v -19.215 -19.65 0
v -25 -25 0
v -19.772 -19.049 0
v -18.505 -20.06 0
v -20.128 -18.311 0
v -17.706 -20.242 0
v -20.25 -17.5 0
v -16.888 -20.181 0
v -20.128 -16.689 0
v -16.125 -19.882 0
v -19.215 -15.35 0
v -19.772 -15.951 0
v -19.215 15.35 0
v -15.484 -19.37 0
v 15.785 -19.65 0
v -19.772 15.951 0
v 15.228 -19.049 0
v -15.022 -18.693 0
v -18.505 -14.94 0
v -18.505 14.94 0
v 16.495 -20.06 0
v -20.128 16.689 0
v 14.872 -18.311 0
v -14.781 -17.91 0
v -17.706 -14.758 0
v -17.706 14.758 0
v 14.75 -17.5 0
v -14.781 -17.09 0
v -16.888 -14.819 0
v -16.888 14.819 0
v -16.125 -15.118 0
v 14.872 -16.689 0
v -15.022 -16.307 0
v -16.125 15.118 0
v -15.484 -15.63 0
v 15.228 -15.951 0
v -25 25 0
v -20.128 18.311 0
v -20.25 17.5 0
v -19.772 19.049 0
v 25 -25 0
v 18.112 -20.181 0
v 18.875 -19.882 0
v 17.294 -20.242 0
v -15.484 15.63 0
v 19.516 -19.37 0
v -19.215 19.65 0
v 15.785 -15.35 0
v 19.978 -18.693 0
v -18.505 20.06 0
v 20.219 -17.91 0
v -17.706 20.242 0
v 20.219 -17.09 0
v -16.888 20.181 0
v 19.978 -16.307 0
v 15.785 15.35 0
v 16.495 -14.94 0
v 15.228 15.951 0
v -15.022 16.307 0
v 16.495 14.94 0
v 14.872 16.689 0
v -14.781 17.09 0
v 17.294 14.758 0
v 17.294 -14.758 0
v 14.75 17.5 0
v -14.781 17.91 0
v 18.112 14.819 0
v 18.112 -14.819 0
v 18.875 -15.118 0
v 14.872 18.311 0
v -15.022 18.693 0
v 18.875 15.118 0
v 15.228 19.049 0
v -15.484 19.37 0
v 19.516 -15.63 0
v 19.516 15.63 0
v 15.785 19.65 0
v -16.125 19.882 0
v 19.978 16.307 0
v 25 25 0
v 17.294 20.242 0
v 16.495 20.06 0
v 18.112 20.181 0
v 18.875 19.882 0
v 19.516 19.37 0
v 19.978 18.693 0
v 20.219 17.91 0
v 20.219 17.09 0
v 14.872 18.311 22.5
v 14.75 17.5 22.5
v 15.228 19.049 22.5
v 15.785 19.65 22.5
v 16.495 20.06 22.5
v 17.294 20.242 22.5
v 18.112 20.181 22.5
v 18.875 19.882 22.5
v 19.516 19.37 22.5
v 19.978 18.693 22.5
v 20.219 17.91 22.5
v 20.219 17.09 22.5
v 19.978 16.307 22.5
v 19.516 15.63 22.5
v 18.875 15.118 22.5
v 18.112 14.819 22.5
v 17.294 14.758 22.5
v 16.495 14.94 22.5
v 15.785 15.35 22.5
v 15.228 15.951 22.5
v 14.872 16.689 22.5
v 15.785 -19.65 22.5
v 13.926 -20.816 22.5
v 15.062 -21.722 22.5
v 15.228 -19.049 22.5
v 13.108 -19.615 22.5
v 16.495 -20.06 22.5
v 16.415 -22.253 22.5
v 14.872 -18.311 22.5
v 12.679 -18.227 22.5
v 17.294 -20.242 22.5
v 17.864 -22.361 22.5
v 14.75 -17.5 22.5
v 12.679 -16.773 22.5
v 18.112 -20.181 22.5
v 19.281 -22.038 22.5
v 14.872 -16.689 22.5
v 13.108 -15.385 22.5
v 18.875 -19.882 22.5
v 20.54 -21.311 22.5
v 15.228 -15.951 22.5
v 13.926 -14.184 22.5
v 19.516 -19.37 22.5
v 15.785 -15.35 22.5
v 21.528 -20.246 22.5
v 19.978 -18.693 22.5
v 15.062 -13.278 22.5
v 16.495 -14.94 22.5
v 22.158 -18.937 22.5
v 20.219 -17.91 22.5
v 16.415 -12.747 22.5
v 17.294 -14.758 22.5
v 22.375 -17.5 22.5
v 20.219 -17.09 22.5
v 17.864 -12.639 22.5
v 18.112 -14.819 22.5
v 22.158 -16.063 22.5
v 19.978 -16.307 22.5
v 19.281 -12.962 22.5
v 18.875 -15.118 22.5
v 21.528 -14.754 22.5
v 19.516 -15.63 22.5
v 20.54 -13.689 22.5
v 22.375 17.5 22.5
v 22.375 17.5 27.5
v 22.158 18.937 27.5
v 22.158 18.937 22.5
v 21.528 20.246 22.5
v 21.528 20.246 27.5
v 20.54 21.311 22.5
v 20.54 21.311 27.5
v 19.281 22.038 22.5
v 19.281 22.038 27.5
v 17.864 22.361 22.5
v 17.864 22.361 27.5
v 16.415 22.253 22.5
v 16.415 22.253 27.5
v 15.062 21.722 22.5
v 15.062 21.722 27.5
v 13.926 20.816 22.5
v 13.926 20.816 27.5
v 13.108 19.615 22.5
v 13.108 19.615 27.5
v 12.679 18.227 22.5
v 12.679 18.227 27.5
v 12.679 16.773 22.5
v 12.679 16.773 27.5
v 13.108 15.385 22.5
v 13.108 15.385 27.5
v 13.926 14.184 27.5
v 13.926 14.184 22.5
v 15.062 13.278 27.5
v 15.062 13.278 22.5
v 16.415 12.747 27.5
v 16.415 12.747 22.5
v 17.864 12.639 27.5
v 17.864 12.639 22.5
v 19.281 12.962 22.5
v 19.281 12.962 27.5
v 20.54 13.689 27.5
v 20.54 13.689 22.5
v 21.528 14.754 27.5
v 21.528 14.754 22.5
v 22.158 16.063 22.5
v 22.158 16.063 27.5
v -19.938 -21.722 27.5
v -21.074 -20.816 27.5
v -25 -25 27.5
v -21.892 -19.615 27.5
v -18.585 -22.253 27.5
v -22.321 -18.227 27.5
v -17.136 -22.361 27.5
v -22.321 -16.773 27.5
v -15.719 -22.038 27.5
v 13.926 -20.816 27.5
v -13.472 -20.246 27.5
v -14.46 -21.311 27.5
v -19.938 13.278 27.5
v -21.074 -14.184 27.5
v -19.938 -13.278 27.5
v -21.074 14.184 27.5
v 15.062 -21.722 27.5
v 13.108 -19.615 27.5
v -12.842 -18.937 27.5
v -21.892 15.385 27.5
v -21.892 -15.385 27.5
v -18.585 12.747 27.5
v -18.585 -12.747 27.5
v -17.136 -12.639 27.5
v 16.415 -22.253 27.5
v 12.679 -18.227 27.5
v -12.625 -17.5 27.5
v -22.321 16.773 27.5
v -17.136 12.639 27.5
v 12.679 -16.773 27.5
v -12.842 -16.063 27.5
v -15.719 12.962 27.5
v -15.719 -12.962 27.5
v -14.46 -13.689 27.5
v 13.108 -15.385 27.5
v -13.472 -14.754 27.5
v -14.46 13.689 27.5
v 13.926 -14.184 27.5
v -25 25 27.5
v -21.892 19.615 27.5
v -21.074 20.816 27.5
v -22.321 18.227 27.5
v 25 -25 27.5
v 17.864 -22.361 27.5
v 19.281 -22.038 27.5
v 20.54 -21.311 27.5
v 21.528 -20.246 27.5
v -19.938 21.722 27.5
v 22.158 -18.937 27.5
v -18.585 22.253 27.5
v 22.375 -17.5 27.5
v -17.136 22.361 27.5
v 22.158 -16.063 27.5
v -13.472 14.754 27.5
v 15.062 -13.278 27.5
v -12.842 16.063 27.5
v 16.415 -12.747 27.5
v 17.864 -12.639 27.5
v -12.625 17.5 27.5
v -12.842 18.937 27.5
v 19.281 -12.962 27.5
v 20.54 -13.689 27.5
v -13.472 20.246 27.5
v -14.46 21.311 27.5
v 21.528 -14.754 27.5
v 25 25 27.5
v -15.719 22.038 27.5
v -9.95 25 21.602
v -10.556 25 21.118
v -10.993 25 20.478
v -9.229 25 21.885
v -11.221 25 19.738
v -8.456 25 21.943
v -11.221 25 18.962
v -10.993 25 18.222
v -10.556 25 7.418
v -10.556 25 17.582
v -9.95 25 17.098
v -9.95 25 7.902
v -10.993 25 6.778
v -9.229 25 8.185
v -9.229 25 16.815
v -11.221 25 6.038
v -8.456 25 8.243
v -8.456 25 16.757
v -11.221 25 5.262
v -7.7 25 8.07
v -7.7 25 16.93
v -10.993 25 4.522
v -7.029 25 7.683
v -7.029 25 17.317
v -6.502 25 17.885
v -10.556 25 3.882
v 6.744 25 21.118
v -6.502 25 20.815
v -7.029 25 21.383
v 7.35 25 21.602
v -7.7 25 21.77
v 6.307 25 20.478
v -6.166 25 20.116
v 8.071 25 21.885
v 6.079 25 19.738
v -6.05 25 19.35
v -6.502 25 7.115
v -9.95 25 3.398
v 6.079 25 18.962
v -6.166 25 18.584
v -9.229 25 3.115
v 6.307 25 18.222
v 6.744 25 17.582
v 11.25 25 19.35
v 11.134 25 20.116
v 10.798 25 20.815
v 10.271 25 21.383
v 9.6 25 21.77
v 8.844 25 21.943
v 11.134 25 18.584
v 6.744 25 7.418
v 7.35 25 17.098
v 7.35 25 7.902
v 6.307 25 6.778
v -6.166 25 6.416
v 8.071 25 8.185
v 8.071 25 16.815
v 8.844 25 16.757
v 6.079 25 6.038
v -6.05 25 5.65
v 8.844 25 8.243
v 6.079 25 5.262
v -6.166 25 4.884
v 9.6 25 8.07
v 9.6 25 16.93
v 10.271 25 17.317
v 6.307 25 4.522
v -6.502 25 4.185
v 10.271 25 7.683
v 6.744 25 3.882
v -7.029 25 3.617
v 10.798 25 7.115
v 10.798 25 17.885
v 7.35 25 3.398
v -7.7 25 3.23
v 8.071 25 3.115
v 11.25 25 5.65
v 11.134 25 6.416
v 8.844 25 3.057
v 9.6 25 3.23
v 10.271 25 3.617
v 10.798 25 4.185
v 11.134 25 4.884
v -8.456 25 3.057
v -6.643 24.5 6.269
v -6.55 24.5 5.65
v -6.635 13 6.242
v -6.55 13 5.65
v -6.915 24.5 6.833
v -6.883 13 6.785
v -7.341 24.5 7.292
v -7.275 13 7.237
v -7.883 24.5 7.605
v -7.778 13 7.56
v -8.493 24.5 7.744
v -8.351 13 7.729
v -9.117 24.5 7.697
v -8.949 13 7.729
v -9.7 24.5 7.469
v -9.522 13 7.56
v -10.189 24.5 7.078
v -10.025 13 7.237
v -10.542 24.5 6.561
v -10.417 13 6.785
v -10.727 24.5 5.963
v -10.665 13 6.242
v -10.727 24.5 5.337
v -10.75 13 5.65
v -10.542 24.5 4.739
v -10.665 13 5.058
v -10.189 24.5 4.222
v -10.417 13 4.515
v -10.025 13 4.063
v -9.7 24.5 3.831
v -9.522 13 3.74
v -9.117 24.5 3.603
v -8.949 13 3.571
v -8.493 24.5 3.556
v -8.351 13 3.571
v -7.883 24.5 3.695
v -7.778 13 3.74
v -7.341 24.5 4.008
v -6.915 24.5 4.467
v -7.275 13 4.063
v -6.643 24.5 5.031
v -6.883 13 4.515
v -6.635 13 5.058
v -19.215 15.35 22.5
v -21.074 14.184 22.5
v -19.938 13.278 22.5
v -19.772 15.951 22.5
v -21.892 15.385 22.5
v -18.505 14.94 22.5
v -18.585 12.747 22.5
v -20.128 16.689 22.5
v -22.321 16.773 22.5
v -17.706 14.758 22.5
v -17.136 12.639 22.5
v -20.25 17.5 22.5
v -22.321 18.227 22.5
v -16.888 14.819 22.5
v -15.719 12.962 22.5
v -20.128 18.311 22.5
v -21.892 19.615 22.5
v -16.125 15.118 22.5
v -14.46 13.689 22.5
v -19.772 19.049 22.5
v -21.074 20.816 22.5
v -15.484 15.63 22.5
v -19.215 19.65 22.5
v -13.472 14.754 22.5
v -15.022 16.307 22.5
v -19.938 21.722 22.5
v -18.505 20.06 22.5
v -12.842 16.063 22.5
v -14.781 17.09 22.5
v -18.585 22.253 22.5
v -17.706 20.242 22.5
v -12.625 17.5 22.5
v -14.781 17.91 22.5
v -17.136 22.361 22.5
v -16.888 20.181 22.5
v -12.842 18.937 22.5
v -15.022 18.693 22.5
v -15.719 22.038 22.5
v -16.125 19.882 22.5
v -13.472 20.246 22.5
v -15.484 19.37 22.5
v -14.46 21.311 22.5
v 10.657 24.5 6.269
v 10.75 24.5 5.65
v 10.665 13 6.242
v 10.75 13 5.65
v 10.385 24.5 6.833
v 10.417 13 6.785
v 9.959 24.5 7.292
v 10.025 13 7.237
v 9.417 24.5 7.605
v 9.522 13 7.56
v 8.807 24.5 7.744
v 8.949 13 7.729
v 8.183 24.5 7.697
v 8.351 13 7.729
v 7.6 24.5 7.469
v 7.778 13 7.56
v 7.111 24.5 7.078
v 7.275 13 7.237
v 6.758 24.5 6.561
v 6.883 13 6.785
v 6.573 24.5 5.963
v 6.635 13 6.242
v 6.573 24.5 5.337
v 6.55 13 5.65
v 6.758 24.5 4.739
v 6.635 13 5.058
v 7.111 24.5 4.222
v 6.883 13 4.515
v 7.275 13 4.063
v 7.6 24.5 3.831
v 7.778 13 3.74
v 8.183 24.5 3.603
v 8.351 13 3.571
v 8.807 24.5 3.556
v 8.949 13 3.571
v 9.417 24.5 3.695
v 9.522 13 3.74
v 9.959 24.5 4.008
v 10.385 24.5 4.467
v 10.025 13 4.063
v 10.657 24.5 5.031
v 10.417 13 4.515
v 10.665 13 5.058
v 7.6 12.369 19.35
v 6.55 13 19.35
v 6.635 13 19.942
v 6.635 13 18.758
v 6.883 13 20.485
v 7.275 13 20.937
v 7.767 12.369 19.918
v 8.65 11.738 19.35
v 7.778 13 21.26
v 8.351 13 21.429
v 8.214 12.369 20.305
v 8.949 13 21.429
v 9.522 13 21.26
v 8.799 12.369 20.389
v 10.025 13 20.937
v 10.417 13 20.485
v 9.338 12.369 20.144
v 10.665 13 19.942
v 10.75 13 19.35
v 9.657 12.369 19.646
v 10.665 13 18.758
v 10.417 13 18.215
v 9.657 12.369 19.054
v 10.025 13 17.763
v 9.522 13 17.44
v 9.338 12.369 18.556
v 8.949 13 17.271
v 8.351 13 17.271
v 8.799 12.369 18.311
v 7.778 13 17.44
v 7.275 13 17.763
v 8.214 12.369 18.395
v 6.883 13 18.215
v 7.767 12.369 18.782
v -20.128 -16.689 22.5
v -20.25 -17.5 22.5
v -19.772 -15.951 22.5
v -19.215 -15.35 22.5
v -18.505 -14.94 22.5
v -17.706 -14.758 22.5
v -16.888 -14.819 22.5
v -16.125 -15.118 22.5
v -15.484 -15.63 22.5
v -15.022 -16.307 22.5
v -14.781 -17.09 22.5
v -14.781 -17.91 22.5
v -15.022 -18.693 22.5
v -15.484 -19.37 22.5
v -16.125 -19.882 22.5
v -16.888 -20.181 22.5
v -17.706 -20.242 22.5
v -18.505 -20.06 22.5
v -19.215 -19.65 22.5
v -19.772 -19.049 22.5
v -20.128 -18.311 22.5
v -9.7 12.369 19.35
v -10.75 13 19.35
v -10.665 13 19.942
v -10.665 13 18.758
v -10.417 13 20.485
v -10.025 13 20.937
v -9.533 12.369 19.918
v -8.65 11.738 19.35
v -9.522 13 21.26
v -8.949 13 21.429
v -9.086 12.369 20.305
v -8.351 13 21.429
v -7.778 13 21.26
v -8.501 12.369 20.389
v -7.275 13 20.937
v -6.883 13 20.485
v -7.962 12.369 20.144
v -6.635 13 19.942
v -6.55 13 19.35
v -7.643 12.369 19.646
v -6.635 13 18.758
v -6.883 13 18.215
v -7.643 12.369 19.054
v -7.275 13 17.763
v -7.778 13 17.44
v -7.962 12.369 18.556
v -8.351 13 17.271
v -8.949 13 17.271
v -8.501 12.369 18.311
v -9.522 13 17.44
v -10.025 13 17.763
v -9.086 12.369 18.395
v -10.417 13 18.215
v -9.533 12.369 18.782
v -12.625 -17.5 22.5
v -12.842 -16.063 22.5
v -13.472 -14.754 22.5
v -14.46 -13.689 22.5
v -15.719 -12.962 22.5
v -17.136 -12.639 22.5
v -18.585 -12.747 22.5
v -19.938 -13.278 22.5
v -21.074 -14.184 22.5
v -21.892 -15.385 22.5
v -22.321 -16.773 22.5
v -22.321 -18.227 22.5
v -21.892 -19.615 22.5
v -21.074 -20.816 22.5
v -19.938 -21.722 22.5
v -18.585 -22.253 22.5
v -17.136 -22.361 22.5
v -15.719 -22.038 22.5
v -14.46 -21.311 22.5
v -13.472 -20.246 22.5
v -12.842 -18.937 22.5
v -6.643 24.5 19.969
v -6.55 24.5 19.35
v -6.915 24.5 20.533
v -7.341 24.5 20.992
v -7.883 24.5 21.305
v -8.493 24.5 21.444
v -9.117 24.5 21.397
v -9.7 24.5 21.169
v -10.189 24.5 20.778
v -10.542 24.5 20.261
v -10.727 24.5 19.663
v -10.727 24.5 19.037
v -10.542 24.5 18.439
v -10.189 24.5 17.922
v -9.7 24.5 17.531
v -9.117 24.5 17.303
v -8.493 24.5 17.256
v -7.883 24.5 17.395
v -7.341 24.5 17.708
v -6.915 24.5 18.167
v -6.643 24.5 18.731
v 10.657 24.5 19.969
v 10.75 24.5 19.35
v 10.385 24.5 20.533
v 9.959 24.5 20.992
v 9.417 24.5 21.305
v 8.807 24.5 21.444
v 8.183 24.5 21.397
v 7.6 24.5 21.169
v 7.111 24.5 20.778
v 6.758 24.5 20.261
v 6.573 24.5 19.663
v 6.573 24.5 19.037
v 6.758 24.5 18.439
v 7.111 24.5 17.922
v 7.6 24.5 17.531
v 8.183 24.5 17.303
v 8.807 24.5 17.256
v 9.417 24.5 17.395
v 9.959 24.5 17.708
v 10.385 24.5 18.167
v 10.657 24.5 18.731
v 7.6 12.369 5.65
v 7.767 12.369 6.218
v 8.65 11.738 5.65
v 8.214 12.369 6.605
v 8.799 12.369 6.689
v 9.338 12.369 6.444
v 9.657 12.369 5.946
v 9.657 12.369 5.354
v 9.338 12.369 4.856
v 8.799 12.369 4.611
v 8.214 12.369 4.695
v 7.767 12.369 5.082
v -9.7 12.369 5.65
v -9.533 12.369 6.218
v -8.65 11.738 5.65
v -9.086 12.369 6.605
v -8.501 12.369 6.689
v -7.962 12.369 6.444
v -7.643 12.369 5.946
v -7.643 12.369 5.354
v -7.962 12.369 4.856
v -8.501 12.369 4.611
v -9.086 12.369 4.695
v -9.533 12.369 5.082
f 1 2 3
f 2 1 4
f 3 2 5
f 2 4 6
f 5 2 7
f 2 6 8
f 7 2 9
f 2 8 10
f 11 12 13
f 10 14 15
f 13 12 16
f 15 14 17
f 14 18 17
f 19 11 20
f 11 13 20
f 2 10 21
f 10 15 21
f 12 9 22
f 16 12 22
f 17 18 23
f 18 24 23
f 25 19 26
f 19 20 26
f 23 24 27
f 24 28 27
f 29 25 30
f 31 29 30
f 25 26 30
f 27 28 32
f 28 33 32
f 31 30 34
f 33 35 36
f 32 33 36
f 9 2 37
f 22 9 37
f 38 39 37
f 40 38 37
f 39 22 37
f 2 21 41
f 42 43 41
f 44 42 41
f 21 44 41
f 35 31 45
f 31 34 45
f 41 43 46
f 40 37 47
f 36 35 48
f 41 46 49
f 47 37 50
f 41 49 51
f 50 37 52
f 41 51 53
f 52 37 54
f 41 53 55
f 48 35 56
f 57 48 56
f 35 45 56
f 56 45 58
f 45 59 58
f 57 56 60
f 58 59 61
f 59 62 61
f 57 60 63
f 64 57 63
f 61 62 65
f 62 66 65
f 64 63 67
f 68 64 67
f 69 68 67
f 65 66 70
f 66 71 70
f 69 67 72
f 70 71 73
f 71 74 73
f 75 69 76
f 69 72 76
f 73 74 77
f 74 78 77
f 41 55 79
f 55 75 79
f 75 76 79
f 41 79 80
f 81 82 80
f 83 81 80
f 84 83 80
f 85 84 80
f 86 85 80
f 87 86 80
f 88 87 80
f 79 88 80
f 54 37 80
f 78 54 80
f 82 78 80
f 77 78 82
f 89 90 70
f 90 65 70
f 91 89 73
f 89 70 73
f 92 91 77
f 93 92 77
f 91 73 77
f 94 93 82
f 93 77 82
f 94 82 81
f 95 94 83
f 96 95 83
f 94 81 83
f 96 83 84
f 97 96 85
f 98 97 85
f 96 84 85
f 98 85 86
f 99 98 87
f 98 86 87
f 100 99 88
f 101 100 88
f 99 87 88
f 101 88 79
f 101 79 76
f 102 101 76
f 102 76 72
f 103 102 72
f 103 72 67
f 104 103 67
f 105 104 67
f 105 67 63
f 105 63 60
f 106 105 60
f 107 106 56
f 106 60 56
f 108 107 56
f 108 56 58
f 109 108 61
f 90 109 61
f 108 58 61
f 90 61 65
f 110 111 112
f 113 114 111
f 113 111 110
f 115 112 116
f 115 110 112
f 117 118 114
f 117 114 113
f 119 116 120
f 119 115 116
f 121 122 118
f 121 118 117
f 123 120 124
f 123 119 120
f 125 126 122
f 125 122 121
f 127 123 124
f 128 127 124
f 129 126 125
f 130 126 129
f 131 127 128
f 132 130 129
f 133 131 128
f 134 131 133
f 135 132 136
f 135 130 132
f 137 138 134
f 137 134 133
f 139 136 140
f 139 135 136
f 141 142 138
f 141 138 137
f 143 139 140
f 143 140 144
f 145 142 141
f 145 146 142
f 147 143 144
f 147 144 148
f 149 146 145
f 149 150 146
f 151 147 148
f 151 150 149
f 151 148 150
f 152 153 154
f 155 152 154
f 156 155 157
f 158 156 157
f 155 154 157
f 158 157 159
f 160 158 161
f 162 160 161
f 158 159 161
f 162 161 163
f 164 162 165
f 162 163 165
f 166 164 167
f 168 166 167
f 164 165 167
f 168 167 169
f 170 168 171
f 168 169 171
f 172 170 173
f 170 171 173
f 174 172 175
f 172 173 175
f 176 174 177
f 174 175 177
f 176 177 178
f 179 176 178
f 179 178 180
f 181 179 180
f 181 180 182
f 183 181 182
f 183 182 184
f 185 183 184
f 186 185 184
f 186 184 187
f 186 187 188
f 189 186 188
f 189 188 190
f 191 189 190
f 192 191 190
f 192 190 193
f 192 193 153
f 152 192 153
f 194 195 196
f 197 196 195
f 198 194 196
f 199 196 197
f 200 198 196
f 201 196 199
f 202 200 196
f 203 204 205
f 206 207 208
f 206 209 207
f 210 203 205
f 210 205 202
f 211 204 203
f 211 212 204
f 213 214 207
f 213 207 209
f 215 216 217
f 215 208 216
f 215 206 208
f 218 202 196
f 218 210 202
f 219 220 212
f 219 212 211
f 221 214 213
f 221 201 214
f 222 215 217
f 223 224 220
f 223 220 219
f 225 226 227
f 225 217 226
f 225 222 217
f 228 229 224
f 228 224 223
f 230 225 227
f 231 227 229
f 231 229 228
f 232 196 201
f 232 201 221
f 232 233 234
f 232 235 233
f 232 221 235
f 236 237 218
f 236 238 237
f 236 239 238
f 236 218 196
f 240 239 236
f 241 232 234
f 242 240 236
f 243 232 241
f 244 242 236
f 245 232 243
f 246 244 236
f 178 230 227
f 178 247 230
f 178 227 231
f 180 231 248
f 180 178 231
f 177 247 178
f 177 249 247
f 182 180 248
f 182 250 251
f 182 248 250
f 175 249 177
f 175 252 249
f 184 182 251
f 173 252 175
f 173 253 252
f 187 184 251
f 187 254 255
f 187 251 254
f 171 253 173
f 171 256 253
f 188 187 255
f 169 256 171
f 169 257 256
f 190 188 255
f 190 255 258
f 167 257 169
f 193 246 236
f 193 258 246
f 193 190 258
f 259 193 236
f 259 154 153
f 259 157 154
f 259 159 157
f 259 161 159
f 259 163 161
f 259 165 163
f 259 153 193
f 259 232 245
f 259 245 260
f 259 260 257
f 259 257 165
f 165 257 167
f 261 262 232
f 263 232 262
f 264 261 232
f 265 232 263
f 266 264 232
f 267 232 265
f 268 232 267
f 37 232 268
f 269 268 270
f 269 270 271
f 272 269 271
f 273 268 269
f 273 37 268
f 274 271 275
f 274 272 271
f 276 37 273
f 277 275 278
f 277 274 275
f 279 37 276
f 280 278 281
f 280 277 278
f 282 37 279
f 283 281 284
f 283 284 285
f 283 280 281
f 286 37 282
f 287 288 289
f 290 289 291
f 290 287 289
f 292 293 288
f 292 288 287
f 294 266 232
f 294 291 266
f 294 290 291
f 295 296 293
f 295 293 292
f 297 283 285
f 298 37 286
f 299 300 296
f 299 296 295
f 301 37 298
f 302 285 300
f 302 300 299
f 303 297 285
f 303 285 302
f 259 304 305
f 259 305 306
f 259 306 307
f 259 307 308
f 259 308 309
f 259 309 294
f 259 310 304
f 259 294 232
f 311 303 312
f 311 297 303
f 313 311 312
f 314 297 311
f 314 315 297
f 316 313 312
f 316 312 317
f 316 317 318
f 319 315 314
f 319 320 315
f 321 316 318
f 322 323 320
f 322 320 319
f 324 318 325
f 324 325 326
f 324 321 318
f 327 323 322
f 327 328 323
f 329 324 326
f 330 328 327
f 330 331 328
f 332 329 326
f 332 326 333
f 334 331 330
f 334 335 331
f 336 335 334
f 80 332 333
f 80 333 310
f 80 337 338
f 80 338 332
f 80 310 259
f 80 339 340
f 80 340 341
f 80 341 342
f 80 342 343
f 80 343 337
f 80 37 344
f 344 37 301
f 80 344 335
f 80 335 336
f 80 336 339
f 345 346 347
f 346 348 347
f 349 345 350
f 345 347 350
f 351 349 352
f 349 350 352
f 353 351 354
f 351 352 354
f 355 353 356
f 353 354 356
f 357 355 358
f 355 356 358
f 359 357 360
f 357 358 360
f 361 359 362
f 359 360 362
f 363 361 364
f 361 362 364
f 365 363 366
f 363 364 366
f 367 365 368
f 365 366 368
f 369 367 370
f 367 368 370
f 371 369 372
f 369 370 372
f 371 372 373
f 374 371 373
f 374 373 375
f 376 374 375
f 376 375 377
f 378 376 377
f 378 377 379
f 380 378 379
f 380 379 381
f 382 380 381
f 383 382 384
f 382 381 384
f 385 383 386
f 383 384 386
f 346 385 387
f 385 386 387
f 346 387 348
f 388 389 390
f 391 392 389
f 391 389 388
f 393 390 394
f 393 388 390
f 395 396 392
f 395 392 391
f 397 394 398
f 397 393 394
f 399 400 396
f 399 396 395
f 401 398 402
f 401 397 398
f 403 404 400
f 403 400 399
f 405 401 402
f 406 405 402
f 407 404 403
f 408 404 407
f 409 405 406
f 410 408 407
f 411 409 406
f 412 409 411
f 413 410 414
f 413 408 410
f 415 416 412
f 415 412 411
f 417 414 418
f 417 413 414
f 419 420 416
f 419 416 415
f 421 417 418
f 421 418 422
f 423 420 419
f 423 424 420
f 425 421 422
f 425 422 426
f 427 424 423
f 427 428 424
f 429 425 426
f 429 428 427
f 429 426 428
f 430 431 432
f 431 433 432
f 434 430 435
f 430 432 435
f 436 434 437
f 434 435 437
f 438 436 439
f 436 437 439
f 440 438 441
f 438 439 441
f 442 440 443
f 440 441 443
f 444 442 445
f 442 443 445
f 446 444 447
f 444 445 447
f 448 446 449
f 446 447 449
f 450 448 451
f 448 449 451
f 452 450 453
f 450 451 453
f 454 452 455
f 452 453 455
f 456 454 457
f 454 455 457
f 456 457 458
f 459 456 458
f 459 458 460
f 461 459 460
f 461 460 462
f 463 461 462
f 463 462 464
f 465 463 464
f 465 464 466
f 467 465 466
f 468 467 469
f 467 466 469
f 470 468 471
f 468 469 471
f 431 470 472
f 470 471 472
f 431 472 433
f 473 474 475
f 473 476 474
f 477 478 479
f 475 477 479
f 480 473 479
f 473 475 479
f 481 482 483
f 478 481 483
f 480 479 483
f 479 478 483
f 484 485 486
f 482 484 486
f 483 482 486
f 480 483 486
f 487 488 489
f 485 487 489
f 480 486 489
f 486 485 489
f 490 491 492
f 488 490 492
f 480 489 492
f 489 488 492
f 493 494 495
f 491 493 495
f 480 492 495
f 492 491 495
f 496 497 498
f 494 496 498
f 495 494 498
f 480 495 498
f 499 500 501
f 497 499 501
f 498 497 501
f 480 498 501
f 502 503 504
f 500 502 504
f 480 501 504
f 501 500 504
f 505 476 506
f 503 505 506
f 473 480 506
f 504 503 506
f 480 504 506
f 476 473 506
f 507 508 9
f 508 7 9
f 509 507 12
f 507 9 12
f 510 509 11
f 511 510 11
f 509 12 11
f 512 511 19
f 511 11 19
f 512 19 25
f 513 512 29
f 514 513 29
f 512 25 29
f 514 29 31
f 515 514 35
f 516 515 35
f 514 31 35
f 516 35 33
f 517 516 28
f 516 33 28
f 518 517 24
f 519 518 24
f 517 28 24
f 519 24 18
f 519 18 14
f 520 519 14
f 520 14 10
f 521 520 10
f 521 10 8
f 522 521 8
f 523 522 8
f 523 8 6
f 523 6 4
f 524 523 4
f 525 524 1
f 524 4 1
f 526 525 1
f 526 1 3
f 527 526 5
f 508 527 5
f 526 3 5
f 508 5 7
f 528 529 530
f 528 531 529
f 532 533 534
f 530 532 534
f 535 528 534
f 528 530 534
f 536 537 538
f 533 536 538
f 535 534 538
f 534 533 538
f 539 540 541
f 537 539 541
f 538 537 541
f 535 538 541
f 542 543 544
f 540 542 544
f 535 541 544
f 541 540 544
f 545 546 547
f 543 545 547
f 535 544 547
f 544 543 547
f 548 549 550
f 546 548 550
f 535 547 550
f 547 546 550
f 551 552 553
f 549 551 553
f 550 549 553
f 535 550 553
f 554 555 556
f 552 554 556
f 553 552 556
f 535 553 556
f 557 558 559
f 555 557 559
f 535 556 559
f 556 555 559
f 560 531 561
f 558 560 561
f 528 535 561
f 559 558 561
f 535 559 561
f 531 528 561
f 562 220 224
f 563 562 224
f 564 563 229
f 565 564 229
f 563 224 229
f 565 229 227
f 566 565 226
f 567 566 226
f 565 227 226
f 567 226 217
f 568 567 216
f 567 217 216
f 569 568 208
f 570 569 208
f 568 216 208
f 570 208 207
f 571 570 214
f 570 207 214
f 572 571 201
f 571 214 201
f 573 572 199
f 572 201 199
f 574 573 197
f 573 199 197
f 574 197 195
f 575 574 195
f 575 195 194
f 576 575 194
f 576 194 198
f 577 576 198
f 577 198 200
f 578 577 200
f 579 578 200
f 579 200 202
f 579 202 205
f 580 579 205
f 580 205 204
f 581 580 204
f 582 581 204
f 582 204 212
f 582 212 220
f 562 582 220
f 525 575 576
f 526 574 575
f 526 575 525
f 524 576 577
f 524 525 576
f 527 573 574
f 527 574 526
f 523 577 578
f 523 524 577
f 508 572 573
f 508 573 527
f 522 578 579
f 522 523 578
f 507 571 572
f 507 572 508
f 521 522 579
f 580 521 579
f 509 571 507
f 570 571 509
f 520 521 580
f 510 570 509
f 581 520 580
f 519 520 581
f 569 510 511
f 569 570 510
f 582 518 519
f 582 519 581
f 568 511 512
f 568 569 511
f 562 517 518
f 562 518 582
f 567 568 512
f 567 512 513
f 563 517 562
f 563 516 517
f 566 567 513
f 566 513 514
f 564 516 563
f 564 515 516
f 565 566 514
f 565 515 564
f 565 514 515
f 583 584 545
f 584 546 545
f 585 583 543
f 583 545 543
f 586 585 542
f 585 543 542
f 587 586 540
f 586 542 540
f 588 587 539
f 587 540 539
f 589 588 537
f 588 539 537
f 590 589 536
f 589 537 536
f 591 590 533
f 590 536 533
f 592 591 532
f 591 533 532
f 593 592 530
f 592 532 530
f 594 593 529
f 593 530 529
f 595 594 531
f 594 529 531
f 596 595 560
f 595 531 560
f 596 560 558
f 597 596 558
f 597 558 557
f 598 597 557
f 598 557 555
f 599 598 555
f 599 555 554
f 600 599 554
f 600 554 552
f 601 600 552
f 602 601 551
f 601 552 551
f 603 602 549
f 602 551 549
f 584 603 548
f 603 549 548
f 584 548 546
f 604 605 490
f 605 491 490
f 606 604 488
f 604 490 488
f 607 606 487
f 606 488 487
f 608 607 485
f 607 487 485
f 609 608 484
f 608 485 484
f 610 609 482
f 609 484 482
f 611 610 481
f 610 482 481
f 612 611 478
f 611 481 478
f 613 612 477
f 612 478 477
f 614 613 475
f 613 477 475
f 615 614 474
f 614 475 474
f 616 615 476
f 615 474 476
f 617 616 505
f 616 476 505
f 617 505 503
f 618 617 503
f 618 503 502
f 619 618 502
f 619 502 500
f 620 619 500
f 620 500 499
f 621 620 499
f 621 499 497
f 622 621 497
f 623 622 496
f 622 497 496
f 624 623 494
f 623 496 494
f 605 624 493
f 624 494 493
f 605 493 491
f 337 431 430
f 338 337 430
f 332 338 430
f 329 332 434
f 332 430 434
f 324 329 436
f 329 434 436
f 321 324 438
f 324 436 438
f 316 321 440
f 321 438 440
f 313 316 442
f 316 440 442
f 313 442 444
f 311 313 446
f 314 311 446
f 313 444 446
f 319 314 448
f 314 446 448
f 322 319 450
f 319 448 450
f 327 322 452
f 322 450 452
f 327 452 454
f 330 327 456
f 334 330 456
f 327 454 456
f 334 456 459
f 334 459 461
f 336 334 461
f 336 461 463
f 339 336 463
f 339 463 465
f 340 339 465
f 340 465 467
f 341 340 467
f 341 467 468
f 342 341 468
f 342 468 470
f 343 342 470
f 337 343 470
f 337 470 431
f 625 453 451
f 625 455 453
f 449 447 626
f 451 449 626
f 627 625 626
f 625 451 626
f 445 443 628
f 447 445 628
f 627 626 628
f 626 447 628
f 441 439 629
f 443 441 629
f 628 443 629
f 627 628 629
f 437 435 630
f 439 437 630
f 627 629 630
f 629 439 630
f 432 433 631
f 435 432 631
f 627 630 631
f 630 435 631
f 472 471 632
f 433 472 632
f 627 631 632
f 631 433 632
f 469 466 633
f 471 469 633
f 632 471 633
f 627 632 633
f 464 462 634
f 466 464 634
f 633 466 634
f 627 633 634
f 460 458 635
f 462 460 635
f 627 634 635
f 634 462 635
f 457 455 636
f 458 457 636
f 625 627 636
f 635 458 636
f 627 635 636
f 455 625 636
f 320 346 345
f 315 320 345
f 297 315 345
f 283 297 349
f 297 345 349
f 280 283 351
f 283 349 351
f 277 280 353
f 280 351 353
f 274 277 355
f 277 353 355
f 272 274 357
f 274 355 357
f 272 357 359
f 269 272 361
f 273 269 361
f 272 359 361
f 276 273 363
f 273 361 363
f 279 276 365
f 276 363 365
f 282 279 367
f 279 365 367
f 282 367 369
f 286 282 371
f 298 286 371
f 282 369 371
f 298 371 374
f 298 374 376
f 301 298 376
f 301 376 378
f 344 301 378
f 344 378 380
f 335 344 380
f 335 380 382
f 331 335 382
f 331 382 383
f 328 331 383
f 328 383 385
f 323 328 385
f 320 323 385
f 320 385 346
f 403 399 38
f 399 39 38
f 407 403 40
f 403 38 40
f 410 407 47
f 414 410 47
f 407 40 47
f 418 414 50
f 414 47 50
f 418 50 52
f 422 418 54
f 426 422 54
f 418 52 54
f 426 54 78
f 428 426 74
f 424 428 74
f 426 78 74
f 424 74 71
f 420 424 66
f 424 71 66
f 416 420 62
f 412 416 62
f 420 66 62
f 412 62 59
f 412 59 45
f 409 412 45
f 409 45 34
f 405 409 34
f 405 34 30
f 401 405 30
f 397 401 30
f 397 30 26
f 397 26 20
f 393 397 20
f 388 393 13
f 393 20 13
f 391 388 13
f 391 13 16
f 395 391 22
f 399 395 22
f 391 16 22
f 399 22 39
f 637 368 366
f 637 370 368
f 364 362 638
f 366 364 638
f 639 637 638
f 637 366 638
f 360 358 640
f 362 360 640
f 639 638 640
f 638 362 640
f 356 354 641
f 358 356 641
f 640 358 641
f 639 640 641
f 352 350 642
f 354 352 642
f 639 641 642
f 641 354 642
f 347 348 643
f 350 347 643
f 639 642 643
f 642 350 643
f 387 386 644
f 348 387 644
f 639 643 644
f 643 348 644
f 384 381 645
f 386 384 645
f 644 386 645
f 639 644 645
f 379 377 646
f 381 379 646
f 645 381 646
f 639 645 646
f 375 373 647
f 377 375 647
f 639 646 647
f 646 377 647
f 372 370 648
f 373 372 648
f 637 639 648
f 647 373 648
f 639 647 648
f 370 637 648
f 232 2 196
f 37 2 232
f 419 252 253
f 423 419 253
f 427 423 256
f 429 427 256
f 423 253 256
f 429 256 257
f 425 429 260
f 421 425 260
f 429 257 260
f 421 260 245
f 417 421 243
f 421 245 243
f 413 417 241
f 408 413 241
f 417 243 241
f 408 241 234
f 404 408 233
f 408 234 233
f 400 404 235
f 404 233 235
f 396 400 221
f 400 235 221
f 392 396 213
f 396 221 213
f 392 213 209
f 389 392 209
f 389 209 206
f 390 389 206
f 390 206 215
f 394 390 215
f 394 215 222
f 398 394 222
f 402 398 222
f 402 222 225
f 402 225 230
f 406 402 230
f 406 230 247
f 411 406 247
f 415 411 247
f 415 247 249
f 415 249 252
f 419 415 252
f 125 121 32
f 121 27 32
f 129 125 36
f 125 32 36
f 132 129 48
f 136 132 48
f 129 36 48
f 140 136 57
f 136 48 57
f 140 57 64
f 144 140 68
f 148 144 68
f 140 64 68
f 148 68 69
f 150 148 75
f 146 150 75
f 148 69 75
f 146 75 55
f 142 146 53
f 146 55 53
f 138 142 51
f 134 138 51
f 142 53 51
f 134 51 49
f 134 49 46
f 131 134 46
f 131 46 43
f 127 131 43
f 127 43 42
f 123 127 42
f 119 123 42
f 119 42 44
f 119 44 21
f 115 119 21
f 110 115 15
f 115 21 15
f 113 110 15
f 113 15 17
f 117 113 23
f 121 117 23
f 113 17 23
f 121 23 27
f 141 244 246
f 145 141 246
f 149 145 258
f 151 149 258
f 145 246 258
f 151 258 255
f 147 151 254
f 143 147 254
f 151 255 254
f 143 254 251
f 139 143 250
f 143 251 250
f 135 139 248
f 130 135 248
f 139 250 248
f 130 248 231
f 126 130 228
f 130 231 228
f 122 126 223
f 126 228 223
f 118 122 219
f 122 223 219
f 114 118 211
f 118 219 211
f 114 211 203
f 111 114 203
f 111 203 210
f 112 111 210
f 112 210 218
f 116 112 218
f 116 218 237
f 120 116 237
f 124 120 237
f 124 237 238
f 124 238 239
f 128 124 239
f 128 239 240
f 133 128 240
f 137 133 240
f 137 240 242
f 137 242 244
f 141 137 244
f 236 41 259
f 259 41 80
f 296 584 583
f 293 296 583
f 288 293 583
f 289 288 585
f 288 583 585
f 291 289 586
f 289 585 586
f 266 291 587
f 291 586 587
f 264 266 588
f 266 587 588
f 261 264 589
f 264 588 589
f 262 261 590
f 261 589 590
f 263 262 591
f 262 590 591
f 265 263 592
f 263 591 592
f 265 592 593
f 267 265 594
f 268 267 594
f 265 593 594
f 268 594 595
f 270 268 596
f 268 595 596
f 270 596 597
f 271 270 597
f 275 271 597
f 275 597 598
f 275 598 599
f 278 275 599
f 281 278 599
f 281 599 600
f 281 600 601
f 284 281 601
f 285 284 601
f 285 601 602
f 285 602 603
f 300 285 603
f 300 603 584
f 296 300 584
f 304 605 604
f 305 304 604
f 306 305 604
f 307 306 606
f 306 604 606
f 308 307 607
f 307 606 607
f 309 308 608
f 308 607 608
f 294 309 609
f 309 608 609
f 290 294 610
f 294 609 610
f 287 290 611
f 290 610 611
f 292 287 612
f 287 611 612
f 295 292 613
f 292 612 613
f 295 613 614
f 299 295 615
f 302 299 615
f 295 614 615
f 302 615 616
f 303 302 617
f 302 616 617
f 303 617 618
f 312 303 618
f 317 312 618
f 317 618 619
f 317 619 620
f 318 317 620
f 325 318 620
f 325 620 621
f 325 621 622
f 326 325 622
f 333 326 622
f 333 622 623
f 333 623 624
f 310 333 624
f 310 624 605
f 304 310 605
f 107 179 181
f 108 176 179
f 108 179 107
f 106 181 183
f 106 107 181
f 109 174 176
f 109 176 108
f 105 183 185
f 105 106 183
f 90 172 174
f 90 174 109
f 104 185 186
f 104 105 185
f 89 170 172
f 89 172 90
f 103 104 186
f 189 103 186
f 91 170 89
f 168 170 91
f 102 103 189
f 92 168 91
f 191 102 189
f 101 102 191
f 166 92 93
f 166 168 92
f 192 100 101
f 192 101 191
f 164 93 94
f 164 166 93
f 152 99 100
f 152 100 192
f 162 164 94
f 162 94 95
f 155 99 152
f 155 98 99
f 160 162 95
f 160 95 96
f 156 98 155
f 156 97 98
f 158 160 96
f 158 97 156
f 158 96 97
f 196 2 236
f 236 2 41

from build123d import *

# Parameters (mm, degrees)
F0_W           = 50
F0_H           = 50
F1_DEPTH       = 27.5
F3_D           = 5.5
F3_CBORE_D     = 9.75
F3_CBORE_DEPTH = 5
F5_D           = 4.2
F5_DEPTH       = 12
F5_CSINK_D     = 5.2
F5_CSINK_ANGLE = 90
F5_TIP         = 1.2618073


with BuildPart() as f1:
    # F0 (on Top) → F1 (new body)
    with BuildSketch(Plane.XY):
        Rectangle(F0_W, F0_H)
    extrude(amount=F1_DEPTH)

    # F3 (through all)
    with Locations(Plane.XY.offset(27.5)):
        with Locations((-17.5, 17.5), (17.5, 17.5), (-17.5, -17.5), (17.5, -17.5)):
            CounterBoreHole(F3_D / 2, F3_CBORE_D / 2, F3_CBORE_DEPTH)

    # F5
    with Locations(Plane(origin=(0, 25, 0), x_dir=(-1, 0, 0), z_dir=(0, 1, 0))):
        with Locations((-8.65, 19.35), (8.65, 19.35), (8.65, 5.65), (-8.65, 5.65)):
            CounterSinkHole(F5_D / 2, F5_CSINK_D / 2, depth=F5_DEPTH, counter_sink_angle=F5_CSINK_ANGLE)
            with Locations((0, 0, -(F5_DEPTH + F5_TIP / 2))):  # 118° drill point
                Cone(0, F5_D / 2, F5_TIP, mode=Mode.SUBTRACT)


solid = f1.part
